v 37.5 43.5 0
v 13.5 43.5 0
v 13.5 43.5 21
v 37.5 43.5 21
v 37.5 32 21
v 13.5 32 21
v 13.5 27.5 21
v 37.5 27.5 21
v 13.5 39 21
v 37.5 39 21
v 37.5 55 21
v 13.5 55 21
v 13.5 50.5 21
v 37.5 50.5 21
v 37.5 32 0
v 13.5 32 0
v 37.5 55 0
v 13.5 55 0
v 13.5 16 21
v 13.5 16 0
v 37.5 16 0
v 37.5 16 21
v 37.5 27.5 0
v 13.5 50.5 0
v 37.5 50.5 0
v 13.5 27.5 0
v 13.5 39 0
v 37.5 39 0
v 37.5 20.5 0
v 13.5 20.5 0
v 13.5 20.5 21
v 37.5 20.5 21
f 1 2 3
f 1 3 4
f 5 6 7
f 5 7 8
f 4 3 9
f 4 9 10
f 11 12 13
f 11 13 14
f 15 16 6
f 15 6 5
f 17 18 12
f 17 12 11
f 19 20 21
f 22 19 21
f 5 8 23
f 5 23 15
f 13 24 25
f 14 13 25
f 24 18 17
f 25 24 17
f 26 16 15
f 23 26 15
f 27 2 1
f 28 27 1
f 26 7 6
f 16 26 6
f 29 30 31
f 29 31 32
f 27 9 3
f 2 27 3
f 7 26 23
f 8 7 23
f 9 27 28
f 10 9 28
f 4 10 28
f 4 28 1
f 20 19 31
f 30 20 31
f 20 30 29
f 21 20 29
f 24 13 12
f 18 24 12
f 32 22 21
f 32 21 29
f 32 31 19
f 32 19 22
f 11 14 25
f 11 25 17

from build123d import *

# Parameters (mm, degrees)
BOX001_W     = 24
BOX001_H     = 4.5
BOX001_DEPTH = 21
BOX002_W     = 24
BOX002_H     = 4.5
BOX002_DEPTH = 21
BOX003_W     = 24
BOX003_H     = 4.5
BOX003_DEPTH = 21
BOX_W        = 24
BOX_H        = 4.5
BOX_DEPTH    = 21


with BuildPart() as cube001:
    # Box001 → Box001 (new body)
    with BuildSketch(Plane(origin=(13.5, 27.5, 0), x_dir=(1, 0, 0), z_dir=(0, 0, 1))):
        with Locations((12, 2.25)):
            Rectangle(BOX001_W, BOX001_H)
    extrude(amount=BOX001_DEPTH)


with BuildPart() as cube002:
    # Box002 → Box002 (new body)
    with BuildSketch(Plane(origin=(13.5, 39, 0), x_dir=(1, 0, 0), z_dir=(0, 0, 1))):
        with Locations((12, 2.25)):
            Rectangle(BOX002_W, BOX002_H)
    extrude(amount=BOX002_DEPTH)


with BuildPart() as cube003:
    # Box003 → Box003 (new body)
    with BuildSketch(Plane(origin=(13.5, 50.5, 0), x_dir=(1, 0, 0), z_dir=(0, 0, 1))):
        with Locations((12, 2.25)):
            Rectangle(BOX003_W, BOX003_H)
    extrude(amount=BOX003_DEPTH)


with BuildPart() as relay:
    # Box → Box (new body)
    with BuildSketch(Plane(origin=(13.5, 16, 0), x_dir=(1, 0, 0), z_dir=(0, 0, 1))):
        with Locations((12, 2.25)):
            Rectangle(BOX_W, BOX_H)
    extrude(amount=BOX_DEPTH)

    # Fusion: union Cube001, Cube002, Cube003
    add(cube001.part)
    add(cube002.part)
    add(cube003.part)


solid = relay.part
